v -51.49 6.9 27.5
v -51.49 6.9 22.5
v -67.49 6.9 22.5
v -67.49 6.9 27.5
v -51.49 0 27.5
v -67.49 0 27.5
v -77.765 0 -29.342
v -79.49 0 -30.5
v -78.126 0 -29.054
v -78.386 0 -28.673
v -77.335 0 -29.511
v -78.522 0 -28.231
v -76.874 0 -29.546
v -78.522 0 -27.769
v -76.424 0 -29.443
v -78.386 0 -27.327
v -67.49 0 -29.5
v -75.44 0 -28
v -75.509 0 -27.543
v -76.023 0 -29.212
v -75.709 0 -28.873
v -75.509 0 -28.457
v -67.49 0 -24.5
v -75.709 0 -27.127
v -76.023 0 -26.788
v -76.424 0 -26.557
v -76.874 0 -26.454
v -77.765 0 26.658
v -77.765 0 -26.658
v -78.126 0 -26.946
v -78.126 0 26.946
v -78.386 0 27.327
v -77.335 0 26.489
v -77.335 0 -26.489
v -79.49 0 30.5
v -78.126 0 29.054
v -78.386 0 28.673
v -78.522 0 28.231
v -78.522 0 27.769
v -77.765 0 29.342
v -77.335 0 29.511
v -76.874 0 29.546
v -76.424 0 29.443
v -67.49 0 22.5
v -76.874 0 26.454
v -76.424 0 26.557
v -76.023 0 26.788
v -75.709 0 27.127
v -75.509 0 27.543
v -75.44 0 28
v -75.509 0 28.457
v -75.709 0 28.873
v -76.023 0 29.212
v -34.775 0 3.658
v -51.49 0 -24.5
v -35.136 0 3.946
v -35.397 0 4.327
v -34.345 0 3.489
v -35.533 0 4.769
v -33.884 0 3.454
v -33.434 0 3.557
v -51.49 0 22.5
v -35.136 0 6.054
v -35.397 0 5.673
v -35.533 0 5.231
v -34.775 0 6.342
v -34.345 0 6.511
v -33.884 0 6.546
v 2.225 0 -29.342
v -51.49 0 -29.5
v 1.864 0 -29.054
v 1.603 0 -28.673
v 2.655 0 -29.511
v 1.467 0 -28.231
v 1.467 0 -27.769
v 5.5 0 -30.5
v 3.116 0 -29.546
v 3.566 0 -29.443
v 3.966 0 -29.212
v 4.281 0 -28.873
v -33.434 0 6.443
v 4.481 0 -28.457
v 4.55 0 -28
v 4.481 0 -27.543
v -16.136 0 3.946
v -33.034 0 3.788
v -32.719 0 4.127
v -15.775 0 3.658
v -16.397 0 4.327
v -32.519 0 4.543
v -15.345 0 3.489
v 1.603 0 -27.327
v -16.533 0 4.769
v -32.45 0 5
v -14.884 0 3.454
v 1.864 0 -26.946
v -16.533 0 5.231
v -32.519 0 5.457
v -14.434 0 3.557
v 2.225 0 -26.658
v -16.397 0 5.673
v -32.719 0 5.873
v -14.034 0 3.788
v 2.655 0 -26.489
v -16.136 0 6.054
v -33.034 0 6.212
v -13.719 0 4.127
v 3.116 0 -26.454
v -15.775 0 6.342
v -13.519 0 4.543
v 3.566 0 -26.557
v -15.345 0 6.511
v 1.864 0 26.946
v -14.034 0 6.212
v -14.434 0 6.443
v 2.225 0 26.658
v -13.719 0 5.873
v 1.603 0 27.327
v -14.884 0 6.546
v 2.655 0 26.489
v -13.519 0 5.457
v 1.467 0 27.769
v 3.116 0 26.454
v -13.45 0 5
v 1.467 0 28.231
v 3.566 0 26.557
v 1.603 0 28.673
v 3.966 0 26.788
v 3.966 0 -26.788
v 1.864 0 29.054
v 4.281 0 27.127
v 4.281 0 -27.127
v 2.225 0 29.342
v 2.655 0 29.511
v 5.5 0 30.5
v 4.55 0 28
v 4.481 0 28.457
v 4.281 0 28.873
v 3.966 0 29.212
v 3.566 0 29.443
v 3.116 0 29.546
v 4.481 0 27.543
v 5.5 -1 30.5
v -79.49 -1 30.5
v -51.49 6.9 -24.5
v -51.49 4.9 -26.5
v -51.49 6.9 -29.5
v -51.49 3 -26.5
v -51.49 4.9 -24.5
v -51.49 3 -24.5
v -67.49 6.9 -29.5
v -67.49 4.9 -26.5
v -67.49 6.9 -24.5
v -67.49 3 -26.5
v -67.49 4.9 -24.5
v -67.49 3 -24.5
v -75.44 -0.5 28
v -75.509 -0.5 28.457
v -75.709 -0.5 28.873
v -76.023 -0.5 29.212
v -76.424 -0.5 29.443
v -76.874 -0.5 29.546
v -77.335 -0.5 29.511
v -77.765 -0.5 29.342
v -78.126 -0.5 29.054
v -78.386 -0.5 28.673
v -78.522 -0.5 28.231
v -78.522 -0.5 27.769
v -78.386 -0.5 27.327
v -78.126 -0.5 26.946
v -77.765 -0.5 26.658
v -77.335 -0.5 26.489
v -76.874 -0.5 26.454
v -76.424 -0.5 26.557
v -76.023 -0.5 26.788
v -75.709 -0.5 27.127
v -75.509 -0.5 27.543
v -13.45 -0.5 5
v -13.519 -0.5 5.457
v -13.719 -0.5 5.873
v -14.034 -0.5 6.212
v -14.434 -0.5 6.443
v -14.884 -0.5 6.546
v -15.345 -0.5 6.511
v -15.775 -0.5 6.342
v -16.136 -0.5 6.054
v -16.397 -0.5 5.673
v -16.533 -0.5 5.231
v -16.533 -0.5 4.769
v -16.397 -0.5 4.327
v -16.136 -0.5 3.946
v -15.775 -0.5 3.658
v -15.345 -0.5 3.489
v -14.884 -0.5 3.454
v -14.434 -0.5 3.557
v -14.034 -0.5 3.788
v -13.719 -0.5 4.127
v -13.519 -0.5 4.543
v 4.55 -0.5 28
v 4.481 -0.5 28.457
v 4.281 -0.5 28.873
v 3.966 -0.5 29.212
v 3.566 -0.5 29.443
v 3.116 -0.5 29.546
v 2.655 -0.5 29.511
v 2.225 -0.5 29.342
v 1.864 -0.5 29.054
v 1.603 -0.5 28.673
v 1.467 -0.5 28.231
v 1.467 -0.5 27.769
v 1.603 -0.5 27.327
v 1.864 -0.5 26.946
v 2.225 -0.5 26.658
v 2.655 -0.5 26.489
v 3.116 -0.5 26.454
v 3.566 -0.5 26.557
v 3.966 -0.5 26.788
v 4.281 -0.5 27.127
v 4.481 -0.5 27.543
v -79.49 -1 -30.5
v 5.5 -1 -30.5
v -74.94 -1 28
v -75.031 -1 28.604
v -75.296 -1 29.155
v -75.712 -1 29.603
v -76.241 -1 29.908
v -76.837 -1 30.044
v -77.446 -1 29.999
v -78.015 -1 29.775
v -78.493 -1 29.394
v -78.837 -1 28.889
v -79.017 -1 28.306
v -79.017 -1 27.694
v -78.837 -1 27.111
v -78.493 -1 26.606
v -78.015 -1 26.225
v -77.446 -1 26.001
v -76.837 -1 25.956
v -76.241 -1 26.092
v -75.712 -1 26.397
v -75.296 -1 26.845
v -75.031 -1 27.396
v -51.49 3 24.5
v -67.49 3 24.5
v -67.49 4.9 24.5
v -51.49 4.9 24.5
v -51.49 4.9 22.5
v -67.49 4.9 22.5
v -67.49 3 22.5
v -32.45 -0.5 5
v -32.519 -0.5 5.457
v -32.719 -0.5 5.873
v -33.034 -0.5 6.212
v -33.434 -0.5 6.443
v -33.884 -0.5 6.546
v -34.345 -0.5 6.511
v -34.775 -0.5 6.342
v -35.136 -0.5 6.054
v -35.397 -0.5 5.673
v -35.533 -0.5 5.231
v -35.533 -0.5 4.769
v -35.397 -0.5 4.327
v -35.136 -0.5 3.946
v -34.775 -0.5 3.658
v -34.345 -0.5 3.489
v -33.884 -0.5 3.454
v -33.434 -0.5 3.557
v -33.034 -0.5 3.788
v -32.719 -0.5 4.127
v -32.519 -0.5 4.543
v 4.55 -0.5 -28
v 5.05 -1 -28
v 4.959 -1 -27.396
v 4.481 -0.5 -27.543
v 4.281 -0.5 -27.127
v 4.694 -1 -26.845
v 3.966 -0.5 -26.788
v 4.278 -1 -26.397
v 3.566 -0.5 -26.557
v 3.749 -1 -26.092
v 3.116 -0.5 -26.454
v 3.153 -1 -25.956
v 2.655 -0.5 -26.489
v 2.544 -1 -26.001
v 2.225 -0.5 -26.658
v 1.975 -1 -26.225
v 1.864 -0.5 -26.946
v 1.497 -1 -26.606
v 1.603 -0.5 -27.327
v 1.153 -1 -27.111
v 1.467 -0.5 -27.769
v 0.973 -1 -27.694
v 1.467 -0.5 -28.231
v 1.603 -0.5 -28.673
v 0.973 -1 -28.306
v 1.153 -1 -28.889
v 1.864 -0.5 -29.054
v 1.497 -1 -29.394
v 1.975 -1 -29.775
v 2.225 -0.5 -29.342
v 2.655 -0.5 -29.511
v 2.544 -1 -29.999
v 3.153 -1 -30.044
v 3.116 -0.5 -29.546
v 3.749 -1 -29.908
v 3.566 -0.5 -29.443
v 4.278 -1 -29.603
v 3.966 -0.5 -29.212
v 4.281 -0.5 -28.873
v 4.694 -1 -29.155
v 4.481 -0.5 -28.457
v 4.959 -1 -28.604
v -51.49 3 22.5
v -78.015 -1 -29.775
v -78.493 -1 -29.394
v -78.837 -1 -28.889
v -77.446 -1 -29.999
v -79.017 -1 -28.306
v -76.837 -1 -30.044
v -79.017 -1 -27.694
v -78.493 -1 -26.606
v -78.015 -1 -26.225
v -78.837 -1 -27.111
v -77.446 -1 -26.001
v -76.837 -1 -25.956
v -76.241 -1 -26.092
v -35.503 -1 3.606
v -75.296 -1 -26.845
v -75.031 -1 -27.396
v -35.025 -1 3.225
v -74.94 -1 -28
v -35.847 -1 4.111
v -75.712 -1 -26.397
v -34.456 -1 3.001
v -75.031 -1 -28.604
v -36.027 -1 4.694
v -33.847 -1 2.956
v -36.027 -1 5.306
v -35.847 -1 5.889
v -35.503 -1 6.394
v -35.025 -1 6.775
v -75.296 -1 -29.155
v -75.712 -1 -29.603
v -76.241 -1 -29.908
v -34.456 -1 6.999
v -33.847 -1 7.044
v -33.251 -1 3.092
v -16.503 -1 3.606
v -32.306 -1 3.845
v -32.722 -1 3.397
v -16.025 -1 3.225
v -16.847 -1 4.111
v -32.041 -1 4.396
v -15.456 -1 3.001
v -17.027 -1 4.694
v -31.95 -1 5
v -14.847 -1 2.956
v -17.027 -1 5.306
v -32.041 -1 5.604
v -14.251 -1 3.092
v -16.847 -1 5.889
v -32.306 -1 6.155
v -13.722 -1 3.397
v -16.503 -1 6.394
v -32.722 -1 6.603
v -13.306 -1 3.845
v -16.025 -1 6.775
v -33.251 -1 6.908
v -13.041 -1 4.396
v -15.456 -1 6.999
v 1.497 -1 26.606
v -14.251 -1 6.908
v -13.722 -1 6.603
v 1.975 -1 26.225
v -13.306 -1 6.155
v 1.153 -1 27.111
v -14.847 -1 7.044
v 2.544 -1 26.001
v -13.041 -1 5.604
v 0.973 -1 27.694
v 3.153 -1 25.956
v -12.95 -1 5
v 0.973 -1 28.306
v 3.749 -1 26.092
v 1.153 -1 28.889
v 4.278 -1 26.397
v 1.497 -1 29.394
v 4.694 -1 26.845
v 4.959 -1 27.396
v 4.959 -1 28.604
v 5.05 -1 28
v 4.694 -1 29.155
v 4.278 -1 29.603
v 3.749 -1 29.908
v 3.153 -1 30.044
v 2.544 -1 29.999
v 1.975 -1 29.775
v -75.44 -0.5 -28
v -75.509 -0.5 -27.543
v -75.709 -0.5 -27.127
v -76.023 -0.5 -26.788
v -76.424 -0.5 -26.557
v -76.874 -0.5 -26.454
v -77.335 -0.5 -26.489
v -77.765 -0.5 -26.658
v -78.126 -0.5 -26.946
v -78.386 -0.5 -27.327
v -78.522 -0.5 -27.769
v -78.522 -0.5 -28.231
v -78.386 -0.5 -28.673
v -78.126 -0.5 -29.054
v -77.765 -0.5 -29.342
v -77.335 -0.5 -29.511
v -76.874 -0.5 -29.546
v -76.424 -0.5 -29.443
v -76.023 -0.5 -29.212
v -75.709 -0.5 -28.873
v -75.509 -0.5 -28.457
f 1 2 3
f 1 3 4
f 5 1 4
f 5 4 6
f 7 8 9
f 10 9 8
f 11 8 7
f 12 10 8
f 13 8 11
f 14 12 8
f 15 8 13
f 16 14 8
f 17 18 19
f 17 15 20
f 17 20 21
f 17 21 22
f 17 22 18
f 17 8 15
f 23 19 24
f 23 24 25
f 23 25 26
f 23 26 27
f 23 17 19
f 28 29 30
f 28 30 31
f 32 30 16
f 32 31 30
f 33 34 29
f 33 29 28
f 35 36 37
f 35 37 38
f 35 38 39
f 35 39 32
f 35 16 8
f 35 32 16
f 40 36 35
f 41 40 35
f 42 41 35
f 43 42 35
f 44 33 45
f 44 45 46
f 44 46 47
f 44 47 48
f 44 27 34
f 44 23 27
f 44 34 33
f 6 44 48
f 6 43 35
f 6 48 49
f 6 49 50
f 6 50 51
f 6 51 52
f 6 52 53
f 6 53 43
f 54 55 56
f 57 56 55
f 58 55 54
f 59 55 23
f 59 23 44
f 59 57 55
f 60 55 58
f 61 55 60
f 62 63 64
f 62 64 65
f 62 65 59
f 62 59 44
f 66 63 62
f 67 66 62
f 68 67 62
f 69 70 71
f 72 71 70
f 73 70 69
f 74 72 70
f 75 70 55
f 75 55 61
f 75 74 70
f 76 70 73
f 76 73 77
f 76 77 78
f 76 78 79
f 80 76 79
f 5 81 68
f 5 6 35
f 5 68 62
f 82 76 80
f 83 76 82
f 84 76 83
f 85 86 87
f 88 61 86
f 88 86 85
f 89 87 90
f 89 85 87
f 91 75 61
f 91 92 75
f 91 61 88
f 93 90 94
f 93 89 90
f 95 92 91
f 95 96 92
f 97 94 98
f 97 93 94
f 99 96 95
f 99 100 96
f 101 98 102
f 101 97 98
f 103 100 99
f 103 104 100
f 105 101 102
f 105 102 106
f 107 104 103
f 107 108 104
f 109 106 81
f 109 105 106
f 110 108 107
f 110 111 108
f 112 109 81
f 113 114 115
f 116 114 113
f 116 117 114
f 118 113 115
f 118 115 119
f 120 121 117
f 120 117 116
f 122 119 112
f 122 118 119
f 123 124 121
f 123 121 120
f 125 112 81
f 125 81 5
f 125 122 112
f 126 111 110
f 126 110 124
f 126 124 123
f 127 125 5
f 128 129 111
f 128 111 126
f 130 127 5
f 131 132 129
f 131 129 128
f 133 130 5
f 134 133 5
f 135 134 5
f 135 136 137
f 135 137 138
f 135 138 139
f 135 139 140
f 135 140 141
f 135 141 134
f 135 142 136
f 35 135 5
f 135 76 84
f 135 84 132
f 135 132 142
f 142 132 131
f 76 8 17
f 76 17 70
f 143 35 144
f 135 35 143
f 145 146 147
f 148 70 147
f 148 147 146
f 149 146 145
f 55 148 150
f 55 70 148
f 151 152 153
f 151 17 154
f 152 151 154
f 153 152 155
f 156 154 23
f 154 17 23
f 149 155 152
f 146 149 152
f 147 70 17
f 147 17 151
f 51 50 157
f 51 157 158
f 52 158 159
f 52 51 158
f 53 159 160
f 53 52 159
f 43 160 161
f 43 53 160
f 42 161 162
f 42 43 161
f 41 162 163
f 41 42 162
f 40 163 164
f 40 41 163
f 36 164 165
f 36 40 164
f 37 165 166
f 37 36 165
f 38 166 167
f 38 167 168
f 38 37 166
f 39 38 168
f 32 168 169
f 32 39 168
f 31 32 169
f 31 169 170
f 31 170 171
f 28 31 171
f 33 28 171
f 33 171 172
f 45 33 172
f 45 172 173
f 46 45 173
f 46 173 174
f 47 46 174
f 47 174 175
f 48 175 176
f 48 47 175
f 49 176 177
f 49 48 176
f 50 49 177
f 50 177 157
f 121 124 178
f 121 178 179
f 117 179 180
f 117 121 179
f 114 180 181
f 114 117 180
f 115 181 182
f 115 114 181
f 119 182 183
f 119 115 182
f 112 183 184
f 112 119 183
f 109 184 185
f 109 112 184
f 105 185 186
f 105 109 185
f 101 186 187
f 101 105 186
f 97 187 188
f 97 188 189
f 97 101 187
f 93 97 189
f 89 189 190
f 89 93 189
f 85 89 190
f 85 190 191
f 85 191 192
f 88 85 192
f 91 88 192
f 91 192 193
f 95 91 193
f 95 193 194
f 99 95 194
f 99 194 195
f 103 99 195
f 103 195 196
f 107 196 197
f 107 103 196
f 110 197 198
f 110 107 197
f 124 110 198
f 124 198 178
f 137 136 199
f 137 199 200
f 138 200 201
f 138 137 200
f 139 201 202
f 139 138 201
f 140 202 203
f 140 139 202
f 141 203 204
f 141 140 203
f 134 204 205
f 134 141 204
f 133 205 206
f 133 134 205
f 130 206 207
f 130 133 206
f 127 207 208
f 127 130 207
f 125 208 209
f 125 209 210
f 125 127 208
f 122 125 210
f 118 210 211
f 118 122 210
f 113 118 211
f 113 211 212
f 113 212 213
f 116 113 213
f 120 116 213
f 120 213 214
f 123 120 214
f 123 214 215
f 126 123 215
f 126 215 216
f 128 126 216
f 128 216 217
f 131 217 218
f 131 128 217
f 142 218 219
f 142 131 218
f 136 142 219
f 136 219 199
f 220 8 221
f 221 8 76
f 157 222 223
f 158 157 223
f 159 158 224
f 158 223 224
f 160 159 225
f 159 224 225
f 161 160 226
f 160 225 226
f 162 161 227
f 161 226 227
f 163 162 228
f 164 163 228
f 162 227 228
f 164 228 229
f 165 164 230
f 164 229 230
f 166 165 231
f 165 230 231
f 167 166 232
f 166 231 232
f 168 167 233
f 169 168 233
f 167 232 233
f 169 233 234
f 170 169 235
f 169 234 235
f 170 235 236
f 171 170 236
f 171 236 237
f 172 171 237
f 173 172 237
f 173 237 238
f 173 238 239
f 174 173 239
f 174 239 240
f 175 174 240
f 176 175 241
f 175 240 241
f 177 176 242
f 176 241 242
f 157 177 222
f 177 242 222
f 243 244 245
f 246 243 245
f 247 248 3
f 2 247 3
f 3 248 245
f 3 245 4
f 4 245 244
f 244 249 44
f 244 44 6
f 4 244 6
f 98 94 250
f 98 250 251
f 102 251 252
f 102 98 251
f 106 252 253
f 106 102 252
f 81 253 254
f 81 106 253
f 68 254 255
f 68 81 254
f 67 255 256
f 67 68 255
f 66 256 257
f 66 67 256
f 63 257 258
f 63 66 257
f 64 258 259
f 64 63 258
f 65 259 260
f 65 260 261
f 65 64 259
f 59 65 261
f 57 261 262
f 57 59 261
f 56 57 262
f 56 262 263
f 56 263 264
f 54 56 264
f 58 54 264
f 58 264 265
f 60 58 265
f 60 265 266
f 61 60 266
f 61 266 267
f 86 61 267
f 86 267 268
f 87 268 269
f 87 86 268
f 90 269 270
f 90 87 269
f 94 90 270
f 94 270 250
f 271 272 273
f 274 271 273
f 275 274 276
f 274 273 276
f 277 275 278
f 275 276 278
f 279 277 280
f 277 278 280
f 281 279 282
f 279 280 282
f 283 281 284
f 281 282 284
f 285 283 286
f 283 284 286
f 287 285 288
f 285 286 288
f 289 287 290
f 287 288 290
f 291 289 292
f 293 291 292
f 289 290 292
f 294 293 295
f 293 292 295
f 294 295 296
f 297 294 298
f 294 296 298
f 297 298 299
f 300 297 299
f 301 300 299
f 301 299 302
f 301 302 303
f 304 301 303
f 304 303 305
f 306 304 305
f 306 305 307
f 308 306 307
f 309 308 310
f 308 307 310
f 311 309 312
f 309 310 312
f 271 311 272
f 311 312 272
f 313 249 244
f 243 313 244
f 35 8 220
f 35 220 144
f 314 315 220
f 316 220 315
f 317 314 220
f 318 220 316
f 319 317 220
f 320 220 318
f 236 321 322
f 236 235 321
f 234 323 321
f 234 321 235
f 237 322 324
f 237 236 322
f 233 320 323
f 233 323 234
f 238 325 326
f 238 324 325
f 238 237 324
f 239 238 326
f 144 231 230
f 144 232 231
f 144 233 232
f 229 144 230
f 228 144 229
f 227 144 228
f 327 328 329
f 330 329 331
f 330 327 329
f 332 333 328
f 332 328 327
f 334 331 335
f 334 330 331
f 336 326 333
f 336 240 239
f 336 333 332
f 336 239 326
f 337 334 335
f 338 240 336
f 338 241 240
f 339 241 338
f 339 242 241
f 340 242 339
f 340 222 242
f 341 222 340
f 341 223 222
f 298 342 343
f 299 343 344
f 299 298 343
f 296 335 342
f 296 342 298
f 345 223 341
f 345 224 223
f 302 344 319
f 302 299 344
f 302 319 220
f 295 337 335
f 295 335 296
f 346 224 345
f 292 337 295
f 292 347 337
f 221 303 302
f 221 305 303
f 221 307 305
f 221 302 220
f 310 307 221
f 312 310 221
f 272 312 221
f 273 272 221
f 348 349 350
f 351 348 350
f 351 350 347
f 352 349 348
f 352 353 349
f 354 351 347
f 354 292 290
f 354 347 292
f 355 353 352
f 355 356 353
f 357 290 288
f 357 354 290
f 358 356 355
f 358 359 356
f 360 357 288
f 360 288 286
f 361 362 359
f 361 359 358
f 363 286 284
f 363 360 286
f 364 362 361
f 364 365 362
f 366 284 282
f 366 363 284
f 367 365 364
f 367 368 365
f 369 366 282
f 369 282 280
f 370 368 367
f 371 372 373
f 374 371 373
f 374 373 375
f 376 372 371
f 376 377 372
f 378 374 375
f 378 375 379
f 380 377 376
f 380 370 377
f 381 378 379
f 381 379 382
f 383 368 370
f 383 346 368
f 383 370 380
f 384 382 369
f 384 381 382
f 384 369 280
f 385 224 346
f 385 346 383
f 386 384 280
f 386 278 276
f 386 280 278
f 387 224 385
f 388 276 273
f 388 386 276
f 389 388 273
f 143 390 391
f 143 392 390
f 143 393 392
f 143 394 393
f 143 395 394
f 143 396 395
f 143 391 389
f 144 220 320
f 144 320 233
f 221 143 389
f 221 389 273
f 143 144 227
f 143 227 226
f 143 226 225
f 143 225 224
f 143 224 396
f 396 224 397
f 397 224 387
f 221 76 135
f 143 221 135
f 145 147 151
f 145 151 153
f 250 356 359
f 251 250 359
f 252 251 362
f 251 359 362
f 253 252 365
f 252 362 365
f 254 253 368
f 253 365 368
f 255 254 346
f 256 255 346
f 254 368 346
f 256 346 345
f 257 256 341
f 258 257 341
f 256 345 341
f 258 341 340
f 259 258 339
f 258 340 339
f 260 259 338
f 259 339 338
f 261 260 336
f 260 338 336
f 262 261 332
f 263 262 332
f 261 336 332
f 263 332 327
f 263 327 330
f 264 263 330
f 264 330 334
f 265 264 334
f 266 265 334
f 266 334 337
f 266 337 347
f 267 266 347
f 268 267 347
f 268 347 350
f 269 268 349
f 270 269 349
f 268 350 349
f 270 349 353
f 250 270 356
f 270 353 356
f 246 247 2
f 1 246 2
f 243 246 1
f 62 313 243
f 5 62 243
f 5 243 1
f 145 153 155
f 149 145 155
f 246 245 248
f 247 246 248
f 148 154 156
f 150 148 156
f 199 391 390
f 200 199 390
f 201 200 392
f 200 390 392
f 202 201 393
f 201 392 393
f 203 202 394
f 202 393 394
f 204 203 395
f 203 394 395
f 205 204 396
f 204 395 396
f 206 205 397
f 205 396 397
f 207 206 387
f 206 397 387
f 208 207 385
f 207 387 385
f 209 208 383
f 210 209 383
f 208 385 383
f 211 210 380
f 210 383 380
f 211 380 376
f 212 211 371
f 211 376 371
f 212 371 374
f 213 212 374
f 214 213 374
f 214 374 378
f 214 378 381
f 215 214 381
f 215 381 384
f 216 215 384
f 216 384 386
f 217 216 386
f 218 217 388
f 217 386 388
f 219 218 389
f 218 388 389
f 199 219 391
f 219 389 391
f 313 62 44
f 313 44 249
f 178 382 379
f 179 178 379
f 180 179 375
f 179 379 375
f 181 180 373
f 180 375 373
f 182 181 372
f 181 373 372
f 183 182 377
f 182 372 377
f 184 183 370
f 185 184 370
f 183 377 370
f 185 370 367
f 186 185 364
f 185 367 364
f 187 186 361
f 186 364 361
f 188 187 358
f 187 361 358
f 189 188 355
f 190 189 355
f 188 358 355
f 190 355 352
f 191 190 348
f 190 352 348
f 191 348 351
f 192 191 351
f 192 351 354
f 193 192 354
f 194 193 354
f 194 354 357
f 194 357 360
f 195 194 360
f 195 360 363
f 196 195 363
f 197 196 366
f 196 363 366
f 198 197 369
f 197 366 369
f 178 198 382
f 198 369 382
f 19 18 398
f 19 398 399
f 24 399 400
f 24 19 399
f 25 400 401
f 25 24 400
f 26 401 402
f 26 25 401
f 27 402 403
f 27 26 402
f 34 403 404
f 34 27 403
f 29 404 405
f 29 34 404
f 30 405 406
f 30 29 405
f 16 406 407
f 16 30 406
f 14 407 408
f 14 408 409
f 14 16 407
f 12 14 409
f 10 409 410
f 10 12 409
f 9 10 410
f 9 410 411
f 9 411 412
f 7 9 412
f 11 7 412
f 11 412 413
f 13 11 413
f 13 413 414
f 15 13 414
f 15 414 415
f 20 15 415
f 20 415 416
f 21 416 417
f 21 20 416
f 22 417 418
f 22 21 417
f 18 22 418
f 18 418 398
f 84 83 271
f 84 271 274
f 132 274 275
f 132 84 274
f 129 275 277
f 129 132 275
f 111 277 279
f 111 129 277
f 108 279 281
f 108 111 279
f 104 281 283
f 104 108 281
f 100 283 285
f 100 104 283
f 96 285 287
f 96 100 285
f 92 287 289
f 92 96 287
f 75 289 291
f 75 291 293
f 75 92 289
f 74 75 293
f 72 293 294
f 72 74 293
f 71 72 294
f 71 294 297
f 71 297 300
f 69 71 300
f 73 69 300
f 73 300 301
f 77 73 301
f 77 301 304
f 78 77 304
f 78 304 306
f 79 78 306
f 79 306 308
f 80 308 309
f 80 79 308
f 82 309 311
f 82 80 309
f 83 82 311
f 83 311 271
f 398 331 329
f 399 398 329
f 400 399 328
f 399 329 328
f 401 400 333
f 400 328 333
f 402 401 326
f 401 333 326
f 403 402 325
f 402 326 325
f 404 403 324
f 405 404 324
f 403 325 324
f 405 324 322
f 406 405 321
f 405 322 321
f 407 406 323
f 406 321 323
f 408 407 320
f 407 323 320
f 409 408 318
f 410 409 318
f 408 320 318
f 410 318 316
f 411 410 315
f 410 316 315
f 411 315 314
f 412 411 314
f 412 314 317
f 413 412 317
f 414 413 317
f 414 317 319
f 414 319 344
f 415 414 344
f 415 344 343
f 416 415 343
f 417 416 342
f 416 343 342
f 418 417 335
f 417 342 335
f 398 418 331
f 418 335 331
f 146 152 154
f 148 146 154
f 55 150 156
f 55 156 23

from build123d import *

# Parameters (mm, degrees)
SKETCH009_W  = 84.9897948557
SKETCH009_H  = 61
SKETCH009_R  = 1.55
PAD005_DEPTH = 1
CHAMFER_SIZE = 0.5
PAD007_DEPTH = 16


with BuildPart() as part:
    # Sketch009 → Pad005 (new body)
    with BuildSketch(Plane.XZ):
        with Locations((-36.9948974278, 0)):
            Rectangle(SKETCH009_W, SKETCH009_H)
        with Locations((3, -28)):
            Circle(SKETCH009_R, mode=Mode.SUBTRACT)
        with Locations((3, 28)):
            Circle(SKETCH009_R, mode=Mode.SUBTRACT)
        with Locations((-76.9897948557, 28)):
            Circle(SKETCH009_R, mode=Mode.SUBTRACT)
        with Locations((-76.9897948557, -28)):
            Circle(SKETCH009_R, mode=Mode.SUBTRACT)
        with Locations((-15, 5)):
            Circle(SKETCH009_R, mode=Mode.SUBTRACT)
        with Locations((-34, 5)):
            Circle(SKETCH009_R, mode=Mode.SUBTRACT)
    extrude(amount=PAD005_DEPTH)

    # Chamfer
    chamfer_edges = [part.edges().sort_by_distance(p)[0] for p in [
        (-78.539795, -1, -28),
        (-16.55, -1, 5),
        (1.45, -1, 28),
        (1.45, -1, -28),
        (-78.539795, -1, 28),
        (-35.55, -1, 5),
    ]]
    chamfer(chamfer_edges, length=CHAMFER_SIZE)

    # Sketch011 (on DatumPlane) → Pad007 (join)
    with BuildSketch(Plane(origin=(-51.4897948557, 0, 0), x_dir=(0, 0, -1), z_dir=(-1, 0, 0))):
        Polygon((-27.5, 1), (29.5, 1), (29.5, -6.9), (24.5, -6.9), (24.5, -4.9), (26.5, -4.9), (26.5, -3), (24.5, -3), (24.5, 0), (-22.5, 0), (-22.5, -3), (-24.5, -3), (-24.5, -4.9), (-22.5, -4.9), (-22.5, -6.9), (-27.5, -6.9), align=None)
    extrude(amount=PAD007_DEPTH)


solid = part.part
